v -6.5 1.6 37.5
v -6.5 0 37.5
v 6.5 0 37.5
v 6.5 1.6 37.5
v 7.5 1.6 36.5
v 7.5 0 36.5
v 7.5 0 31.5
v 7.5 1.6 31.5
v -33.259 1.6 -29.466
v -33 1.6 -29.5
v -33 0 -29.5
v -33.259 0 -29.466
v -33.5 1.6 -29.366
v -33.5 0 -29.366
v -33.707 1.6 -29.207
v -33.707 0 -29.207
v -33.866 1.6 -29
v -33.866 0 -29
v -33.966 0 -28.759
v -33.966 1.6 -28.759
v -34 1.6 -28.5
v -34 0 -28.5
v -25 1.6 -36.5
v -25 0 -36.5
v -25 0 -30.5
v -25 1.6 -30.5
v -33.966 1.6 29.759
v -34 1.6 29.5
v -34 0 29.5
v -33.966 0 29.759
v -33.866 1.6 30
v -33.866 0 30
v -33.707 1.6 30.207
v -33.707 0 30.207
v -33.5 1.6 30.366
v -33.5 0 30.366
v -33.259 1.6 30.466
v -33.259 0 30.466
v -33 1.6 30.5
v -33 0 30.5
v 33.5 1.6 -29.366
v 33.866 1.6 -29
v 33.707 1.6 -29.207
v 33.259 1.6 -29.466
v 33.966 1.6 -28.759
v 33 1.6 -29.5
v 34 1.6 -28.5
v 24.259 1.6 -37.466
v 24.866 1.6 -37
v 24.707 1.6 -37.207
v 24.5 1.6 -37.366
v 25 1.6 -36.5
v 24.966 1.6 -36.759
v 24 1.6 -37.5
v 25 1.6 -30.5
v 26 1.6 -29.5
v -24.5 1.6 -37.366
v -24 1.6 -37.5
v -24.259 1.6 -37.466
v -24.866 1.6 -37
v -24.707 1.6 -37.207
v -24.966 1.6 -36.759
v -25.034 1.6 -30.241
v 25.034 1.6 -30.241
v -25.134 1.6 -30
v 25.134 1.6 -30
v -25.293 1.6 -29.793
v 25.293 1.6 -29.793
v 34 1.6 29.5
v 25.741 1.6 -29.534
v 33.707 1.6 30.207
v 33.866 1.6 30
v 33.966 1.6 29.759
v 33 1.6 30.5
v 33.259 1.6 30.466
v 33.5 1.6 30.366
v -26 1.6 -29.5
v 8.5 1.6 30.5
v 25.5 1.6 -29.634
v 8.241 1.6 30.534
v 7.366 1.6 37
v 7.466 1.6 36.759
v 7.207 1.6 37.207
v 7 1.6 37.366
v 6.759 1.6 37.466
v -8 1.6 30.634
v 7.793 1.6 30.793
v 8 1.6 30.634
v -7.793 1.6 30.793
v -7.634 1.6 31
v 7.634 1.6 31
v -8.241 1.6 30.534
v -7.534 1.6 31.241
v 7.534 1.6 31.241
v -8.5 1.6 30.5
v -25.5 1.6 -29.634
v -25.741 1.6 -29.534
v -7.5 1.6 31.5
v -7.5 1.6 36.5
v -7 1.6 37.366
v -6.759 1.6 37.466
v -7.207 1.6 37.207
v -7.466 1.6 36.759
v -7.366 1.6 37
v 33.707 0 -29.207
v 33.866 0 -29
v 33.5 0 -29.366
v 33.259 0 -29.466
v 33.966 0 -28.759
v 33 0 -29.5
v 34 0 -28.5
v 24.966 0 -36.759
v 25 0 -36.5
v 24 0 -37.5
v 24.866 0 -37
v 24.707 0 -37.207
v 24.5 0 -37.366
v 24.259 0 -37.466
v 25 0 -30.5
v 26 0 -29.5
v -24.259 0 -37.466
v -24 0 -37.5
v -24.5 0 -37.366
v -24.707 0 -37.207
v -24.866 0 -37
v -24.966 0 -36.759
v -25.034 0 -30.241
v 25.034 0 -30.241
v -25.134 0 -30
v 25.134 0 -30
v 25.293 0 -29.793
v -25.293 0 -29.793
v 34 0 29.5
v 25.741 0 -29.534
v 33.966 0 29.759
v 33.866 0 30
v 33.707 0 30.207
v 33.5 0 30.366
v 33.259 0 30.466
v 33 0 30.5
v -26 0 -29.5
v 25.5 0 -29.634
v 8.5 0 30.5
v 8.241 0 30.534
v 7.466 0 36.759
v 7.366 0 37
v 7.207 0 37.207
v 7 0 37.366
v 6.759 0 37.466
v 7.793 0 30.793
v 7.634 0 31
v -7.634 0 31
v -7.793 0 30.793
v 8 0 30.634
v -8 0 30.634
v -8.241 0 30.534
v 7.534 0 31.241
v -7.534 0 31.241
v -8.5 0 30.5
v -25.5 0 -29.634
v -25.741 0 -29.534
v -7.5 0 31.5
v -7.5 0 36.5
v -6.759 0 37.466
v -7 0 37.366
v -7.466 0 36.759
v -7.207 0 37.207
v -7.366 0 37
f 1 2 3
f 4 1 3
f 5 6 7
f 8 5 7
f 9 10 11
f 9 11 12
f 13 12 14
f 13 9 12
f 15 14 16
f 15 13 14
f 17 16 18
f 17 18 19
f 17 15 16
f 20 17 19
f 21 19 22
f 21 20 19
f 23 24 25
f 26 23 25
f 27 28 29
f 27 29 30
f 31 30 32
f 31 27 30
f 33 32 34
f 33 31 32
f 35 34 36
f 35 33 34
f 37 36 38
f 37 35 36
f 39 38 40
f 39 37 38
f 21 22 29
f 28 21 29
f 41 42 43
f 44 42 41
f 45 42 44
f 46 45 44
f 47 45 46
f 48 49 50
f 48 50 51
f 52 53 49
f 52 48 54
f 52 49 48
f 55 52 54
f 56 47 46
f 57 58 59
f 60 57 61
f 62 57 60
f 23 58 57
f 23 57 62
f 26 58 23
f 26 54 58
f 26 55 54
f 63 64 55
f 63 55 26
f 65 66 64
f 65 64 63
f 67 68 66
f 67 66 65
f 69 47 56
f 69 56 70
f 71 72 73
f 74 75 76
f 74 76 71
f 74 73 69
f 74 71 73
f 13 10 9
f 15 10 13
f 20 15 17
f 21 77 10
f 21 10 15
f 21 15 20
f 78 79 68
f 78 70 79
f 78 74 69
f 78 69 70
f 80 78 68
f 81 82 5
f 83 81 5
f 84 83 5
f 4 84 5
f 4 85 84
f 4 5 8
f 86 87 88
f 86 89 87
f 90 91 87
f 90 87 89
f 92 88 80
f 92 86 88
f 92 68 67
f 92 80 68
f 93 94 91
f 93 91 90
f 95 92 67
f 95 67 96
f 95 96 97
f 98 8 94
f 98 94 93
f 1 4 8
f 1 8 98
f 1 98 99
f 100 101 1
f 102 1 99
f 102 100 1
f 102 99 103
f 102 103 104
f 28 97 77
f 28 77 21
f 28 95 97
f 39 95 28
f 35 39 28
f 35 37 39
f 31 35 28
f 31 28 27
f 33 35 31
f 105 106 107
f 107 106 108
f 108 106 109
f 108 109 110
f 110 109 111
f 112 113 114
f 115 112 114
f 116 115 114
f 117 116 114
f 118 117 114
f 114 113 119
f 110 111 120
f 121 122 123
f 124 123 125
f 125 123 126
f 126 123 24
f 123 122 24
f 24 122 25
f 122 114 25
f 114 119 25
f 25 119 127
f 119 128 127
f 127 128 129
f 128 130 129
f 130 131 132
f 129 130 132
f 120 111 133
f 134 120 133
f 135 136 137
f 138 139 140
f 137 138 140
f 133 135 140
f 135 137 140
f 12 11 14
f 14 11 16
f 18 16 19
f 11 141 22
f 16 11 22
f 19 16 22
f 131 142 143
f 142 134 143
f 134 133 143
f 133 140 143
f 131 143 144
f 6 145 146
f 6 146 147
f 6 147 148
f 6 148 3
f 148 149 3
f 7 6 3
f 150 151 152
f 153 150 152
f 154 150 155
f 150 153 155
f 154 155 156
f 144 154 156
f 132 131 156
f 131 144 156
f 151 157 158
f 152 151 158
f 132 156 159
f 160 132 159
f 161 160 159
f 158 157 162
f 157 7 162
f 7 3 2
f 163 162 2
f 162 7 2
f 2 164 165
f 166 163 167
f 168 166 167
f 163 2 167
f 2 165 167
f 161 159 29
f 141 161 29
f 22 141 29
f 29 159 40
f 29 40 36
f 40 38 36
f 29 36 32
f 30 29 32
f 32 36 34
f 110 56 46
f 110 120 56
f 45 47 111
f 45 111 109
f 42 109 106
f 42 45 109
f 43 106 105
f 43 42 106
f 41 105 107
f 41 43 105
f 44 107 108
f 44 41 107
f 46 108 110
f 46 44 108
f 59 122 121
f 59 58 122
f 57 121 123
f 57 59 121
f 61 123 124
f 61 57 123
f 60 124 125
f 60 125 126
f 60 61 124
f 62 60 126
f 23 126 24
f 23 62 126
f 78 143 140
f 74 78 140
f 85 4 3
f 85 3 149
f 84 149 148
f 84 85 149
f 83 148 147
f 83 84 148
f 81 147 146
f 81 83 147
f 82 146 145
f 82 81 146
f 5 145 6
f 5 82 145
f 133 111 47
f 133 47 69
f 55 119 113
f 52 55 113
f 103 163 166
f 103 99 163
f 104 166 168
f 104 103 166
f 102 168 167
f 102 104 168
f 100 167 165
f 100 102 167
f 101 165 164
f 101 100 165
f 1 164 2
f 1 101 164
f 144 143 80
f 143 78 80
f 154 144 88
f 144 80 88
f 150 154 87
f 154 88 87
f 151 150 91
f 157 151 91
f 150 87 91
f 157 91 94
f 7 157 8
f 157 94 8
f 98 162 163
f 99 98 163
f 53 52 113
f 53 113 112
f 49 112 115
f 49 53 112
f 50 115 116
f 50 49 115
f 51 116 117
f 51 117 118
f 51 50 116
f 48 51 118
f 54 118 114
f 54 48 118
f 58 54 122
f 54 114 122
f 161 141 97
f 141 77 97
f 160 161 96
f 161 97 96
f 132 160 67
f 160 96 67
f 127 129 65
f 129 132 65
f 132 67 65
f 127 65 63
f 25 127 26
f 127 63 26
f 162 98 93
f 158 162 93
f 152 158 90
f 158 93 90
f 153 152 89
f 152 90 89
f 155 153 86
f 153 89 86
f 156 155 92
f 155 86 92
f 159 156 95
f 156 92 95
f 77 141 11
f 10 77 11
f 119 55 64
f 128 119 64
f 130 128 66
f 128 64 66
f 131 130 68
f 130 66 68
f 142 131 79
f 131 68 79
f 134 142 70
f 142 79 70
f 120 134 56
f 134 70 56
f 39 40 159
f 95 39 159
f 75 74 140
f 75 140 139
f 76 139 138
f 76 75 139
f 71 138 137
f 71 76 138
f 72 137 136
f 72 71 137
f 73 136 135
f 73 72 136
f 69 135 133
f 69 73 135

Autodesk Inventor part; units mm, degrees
ref_plane "YZ Plane" through (0, 0, 0) normal (1, 0, 0) x (0, 1, 0)
ref_plane "XZ Plane" through (0, 0, 0) normal (0, 1, 0) x (-1, 0, 0)
ref_plane "XY Plane" through (0, 0, 0) normal (0, 0, 1) x (1, 0, 0)
sketch "Sketch1" plane through (0, 0, 0) normal (0, 1, 0) x (-1, 0, 0)
  line L0 (-25, -37.5) -> (25, -37.5)
  line L1 (25, -37.5) -> (25, 30.5)
  line L2 (25, 30.5) -> (-25, 30.5)
  line L3 (-25, 30.5) -> (-25, -37.5)
  line L4 (-25, -37.5) -> (25, 30.5) construction
  line L5 (25, -37.5) -> (-25, 30.5) construction
  point P0 (0, -3.5)
  point P1 (0, -3.5)
  point P2 (0, -3.5)
  dimension "d2" = 1.6
  dimension "d0" = 68
  dimension "d1" = 50
extrude "Extrusion1" add sketch "Sketch1" along normal blind 1.6
sketch "Sketch2" plane through (0, 0, 0) normal (0, -1, 0) x (1, 0, 0)
  line L0 (25, 30.5) -> (25, -37.5) projected
  line L1 (25, -29.5) -> (34, -29.5)
  line L2 (34, -29.5) -> (34, 30.5)
  line L3 (34, 30.5) -> (25, 30.5)
  line L4 (25, 30.5) -> (25, -29.5)
  line L5 (-25, -37.5) -> (-25, 30.5) projected
  line L6 (-25, -29.5) -> (-34, -29.5)
  line L7 (-34, -29.5) -> (-34, 30.5)
  line L8 (-34, 30.5) -> (-25, 30.5)
  line L9 (-25, 30.5) -> (-25, -29.5)
  line L10 (25, -37.5) -> (-25, -37.5) projected
  line L11 (-7.5, 37.5) -> (7.5, 37.5)
  line L12 (7.5, 37.5) -> (7.5, 30.5)
  line L13 (7.5, 30.5) -> (-7.5, 30.5)
  line L14 (-7.5, 30.5) -> (-7.5, 37.5)
  line L15 (-7.5, 37.5) -> (7.5, 30.5) construction
  line L16 (7.5, 37.5) -> (-7.5, 30.5) construction
  line L17 (-25, 30.5) -> (25, 30.5) projected
  point P0 (0, 0)
  point P1 (25, 28.5)
  point P2 (25, -35.5)
  point P3 (-25, -35.5)
  point P4 (-25, 28.5)
  point P5 (-23, 30.5)
  point P6 (23, 30.5)
  point P7 (23, -37.5)
  point P8 (-23, -37.5)
  point P9 (25, 23.5)
  point P10 (-25, 23.5)
  point P11 (25, 28.5)
  point P12 (-25, 28.5)
  point P13 (0, 34)
  point P14 (0, 34)
  point P15 (0, 30.5)
  dimension "d5" = 9
  dimension "d6" = 9
  dimension "d8" = 8
  dimension "d12" = 15
  dimension "d13" = 7
extrude "Extrusion2" add sketch "Sketch2" against normal up to surface (1.6 mm away) contours L3 L2 L1 L0 | L13 L14 L11 L12 | L5 L6 L7 L8
fillet "Fillet2" radius 1 12 edges at (-34, 0.8, 30.5) (-25, 0.8, -29.5) (-34, 0.8, -29.5) (25, 0.8, -29.5) (34, 0.8, -29.5) (34, 0.8, 30.5) (25, 0.8, -37.5) (-25, 0.8, -37.5) (7.5, 0.8, 30.5) (7.5, 0.8, 37.5) (-7.5, 0.8, 37.5) (-7.5, 0.8, 30.5)
properties part number "MainBoard"
